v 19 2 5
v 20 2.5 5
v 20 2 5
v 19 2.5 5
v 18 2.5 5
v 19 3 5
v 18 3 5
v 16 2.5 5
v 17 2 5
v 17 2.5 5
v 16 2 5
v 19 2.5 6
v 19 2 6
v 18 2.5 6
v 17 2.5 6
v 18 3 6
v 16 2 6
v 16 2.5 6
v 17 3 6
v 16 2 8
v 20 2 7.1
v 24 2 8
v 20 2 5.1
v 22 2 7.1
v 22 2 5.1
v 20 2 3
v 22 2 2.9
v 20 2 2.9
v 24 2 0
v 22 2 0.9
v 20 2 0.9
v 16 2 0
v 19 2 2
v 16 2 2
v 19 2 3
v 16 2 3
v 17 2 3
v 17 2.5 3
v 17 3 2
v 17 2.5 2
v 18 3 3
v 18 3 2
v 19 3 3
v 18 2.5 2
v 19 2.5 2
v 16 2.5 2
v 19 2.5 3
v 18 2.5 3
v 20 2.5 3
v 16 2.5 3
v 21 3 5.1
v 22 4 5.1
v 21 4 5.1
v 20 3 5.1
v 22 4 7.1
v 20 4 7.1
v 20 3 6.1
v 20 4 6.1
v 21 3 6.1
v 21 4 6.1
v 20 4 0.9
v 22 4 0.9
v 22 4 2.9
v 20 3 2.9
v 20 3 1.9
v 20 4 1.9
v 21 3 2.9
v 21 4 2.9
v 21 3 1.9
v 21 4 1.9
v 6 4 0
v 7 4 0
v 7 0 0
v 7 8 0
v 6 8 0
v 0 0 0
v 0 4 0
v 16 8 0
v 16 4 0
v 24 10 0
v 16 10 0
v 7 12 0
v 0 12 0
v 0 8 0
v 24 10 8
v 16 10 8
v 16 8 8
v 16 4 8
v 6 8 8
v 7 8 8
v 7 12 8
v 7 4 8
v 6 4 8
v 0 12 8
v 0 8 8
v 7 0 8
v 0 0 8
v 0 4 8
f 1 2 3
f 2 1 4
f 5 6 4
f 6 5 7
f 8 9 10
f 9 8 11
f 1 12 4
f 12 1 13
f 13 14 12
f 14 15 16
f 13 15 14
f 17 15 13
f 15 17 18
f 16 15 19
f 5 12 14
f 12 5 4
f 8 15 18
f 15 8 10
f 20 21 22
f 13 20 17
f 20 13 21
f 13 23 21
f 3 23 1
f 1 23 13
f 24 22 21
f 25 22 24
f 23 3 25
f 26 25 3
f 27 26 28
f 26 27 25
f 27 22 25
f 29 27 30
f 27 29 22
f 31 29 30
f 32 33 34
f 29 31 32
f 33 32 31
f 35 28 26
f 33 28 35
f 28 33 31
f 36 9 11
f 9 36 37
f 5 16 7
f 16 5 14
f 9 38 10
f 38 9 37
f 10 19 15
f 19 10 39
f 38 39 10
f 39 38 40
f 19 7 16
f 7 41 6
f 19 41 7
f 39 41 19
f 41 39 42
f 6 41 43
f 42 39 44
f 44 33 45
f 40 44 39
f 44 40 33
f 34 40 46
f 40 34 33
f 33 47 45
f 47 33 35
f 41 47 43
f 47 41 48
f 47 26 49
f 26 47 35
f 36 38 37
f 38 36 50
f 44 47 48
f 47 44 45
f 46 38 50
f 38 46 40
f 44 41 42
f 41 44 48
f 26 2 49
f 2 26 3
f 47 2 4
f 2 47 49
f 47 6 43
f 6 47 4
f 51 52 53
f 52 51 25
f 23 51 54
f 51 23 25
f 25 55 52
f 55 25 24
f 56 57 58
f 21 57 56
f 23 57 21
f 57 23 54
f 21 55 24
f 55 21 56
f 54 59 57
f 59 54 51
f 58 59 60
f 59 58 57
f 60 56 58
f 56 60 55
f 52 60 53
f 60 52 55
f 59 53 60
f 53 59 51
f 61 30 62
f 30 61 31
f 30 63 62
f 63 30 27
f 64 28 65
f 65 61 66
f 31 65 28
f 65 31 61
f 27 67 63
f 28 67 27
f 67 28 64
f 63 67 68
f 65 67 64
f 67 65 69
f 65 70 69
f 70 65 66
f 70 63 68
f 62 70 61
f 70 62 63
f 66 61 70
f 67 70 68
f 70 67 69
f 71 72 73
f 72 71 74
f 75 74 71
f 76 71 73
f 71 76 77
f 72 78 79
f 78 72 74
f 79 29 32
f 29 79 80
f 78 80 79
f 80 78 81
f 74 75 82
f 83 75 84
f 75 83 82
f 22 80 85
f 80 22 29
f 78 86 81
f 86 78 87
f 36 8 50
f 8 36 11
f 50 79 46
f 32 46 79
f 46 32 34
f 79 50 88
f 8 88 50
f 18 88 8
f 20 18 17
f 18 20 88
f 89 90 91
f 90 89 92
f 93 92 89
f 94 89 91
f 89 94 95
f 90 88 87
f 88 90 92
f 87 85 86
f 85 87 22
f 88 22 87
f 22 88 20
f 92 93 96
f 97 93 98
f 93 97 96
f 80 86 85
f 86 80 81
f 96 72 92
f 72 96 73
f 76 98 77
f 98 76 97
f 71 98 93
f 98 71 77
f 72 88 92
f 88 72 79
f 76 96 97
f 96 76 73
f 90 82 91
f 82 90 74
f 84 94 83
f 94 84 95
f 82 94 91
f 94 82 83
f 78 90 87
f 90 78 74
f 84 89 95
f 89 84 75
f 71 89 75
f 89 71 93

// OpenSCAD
//Dualstrusion or regular?
part = "first"; //[first:Body (regular),second:Body (dualstrusion),third:Face(dualstrusion)]

//Pixel size in millimeters
pixel_size = 1;

scale(pixel_size)
{
//make it on its side
translate([0,0,8]) rotate([0,90,0])
{

if(part == "first")
{
union()
{
//legs
cube([8,4,6 + 1]);
translate([0,8,0]) cube([8,4,6 + 1]);
//body
translate([0,4,6]) cube([8,4,12]);
//head
//translate([0,2,16]) cube(8);
//eyes + mouth
difference()
{
translate([0,2,16]) cube(8);

union()
{
//mouth
translate([2,2,16 - 0.1]) cube([1,0.5,3 + 0.1]);
translate([2,2,17]) cube(1);
translate([5,2,16 - 0.1]) cube([1,0.5,3 + 0.1]);
translate([5,2,17]) cube(1);
translate([3,2,17]) cube([2,0.5,3]);
translate([3,2,17]) cube([2,1,2]);
//left eye
translate([1 - 0.1,2,20]) cube([2,1,2]);
translate([1 - 0.1,2,20]) cube([1,2,2]);
translate([2 - 0.1,2,21]) cube([1,2,1]);
//right eye
translate([5 + 0.1,2,20]) cube([2,1,2]);
translate([6 + 0.1,2,20]) cube([1,2,2]);
translate([5 + 0.1,2,21]) cube([1,2,1]);
}
}
}
}
else if (part == "second")
{
union()
{
//legs
cube([8,4,6 + 1]);
translate([0,8,0]) cube([8,4,6 + 1]);
//body
translate([0,4,6]) cube([8,4,12]);
//head
//translate([0,2,16]) cube(8);

//eyes + mouth
difference()
{
translate([0,2,16]) cube(8);

union()
{
//mouth
translate([2,2,16 - 0.1]) cube([1,1,3 + 0.1]);
translate([5,2,16 - 0.1]) cube([1,1,3 + 0.1]);
translate([3,2,17]) cube([2,1,3]);
//left eye
translate([1 - 0.1,1,20]) cube([1,2,2]);
translate([2 - 0.1,1,21]) cube([1,2,1]);
//right eye
translate([6 + 0.1,1,20]) cube([1,2,2]);
translate([5 + 0.1,1,21]) cube([1,2,1]);
}
}
}
}
else if (part == "third")
{
union()
{
//mouth
translate([2,2,16 - 0.1]) cube([1,1,3 + 0.1]);
translate([5,2,16 - 0.1]) cube([1,1,3 + 0.1]);
translate([3,2,17]) cube([2,1,3]);
//left eye
translate([1 - 0.1,2,20]) cube([1,1,2]);
translate([2 - 0.1,2,21]) cube([1,1,1]);
//right eye
translate([6 + 0.1,2,20]) cube([1,1,2]);
translate([5 + 0.1,2,21]) cube([1,1,1]);
}
}

}
}
